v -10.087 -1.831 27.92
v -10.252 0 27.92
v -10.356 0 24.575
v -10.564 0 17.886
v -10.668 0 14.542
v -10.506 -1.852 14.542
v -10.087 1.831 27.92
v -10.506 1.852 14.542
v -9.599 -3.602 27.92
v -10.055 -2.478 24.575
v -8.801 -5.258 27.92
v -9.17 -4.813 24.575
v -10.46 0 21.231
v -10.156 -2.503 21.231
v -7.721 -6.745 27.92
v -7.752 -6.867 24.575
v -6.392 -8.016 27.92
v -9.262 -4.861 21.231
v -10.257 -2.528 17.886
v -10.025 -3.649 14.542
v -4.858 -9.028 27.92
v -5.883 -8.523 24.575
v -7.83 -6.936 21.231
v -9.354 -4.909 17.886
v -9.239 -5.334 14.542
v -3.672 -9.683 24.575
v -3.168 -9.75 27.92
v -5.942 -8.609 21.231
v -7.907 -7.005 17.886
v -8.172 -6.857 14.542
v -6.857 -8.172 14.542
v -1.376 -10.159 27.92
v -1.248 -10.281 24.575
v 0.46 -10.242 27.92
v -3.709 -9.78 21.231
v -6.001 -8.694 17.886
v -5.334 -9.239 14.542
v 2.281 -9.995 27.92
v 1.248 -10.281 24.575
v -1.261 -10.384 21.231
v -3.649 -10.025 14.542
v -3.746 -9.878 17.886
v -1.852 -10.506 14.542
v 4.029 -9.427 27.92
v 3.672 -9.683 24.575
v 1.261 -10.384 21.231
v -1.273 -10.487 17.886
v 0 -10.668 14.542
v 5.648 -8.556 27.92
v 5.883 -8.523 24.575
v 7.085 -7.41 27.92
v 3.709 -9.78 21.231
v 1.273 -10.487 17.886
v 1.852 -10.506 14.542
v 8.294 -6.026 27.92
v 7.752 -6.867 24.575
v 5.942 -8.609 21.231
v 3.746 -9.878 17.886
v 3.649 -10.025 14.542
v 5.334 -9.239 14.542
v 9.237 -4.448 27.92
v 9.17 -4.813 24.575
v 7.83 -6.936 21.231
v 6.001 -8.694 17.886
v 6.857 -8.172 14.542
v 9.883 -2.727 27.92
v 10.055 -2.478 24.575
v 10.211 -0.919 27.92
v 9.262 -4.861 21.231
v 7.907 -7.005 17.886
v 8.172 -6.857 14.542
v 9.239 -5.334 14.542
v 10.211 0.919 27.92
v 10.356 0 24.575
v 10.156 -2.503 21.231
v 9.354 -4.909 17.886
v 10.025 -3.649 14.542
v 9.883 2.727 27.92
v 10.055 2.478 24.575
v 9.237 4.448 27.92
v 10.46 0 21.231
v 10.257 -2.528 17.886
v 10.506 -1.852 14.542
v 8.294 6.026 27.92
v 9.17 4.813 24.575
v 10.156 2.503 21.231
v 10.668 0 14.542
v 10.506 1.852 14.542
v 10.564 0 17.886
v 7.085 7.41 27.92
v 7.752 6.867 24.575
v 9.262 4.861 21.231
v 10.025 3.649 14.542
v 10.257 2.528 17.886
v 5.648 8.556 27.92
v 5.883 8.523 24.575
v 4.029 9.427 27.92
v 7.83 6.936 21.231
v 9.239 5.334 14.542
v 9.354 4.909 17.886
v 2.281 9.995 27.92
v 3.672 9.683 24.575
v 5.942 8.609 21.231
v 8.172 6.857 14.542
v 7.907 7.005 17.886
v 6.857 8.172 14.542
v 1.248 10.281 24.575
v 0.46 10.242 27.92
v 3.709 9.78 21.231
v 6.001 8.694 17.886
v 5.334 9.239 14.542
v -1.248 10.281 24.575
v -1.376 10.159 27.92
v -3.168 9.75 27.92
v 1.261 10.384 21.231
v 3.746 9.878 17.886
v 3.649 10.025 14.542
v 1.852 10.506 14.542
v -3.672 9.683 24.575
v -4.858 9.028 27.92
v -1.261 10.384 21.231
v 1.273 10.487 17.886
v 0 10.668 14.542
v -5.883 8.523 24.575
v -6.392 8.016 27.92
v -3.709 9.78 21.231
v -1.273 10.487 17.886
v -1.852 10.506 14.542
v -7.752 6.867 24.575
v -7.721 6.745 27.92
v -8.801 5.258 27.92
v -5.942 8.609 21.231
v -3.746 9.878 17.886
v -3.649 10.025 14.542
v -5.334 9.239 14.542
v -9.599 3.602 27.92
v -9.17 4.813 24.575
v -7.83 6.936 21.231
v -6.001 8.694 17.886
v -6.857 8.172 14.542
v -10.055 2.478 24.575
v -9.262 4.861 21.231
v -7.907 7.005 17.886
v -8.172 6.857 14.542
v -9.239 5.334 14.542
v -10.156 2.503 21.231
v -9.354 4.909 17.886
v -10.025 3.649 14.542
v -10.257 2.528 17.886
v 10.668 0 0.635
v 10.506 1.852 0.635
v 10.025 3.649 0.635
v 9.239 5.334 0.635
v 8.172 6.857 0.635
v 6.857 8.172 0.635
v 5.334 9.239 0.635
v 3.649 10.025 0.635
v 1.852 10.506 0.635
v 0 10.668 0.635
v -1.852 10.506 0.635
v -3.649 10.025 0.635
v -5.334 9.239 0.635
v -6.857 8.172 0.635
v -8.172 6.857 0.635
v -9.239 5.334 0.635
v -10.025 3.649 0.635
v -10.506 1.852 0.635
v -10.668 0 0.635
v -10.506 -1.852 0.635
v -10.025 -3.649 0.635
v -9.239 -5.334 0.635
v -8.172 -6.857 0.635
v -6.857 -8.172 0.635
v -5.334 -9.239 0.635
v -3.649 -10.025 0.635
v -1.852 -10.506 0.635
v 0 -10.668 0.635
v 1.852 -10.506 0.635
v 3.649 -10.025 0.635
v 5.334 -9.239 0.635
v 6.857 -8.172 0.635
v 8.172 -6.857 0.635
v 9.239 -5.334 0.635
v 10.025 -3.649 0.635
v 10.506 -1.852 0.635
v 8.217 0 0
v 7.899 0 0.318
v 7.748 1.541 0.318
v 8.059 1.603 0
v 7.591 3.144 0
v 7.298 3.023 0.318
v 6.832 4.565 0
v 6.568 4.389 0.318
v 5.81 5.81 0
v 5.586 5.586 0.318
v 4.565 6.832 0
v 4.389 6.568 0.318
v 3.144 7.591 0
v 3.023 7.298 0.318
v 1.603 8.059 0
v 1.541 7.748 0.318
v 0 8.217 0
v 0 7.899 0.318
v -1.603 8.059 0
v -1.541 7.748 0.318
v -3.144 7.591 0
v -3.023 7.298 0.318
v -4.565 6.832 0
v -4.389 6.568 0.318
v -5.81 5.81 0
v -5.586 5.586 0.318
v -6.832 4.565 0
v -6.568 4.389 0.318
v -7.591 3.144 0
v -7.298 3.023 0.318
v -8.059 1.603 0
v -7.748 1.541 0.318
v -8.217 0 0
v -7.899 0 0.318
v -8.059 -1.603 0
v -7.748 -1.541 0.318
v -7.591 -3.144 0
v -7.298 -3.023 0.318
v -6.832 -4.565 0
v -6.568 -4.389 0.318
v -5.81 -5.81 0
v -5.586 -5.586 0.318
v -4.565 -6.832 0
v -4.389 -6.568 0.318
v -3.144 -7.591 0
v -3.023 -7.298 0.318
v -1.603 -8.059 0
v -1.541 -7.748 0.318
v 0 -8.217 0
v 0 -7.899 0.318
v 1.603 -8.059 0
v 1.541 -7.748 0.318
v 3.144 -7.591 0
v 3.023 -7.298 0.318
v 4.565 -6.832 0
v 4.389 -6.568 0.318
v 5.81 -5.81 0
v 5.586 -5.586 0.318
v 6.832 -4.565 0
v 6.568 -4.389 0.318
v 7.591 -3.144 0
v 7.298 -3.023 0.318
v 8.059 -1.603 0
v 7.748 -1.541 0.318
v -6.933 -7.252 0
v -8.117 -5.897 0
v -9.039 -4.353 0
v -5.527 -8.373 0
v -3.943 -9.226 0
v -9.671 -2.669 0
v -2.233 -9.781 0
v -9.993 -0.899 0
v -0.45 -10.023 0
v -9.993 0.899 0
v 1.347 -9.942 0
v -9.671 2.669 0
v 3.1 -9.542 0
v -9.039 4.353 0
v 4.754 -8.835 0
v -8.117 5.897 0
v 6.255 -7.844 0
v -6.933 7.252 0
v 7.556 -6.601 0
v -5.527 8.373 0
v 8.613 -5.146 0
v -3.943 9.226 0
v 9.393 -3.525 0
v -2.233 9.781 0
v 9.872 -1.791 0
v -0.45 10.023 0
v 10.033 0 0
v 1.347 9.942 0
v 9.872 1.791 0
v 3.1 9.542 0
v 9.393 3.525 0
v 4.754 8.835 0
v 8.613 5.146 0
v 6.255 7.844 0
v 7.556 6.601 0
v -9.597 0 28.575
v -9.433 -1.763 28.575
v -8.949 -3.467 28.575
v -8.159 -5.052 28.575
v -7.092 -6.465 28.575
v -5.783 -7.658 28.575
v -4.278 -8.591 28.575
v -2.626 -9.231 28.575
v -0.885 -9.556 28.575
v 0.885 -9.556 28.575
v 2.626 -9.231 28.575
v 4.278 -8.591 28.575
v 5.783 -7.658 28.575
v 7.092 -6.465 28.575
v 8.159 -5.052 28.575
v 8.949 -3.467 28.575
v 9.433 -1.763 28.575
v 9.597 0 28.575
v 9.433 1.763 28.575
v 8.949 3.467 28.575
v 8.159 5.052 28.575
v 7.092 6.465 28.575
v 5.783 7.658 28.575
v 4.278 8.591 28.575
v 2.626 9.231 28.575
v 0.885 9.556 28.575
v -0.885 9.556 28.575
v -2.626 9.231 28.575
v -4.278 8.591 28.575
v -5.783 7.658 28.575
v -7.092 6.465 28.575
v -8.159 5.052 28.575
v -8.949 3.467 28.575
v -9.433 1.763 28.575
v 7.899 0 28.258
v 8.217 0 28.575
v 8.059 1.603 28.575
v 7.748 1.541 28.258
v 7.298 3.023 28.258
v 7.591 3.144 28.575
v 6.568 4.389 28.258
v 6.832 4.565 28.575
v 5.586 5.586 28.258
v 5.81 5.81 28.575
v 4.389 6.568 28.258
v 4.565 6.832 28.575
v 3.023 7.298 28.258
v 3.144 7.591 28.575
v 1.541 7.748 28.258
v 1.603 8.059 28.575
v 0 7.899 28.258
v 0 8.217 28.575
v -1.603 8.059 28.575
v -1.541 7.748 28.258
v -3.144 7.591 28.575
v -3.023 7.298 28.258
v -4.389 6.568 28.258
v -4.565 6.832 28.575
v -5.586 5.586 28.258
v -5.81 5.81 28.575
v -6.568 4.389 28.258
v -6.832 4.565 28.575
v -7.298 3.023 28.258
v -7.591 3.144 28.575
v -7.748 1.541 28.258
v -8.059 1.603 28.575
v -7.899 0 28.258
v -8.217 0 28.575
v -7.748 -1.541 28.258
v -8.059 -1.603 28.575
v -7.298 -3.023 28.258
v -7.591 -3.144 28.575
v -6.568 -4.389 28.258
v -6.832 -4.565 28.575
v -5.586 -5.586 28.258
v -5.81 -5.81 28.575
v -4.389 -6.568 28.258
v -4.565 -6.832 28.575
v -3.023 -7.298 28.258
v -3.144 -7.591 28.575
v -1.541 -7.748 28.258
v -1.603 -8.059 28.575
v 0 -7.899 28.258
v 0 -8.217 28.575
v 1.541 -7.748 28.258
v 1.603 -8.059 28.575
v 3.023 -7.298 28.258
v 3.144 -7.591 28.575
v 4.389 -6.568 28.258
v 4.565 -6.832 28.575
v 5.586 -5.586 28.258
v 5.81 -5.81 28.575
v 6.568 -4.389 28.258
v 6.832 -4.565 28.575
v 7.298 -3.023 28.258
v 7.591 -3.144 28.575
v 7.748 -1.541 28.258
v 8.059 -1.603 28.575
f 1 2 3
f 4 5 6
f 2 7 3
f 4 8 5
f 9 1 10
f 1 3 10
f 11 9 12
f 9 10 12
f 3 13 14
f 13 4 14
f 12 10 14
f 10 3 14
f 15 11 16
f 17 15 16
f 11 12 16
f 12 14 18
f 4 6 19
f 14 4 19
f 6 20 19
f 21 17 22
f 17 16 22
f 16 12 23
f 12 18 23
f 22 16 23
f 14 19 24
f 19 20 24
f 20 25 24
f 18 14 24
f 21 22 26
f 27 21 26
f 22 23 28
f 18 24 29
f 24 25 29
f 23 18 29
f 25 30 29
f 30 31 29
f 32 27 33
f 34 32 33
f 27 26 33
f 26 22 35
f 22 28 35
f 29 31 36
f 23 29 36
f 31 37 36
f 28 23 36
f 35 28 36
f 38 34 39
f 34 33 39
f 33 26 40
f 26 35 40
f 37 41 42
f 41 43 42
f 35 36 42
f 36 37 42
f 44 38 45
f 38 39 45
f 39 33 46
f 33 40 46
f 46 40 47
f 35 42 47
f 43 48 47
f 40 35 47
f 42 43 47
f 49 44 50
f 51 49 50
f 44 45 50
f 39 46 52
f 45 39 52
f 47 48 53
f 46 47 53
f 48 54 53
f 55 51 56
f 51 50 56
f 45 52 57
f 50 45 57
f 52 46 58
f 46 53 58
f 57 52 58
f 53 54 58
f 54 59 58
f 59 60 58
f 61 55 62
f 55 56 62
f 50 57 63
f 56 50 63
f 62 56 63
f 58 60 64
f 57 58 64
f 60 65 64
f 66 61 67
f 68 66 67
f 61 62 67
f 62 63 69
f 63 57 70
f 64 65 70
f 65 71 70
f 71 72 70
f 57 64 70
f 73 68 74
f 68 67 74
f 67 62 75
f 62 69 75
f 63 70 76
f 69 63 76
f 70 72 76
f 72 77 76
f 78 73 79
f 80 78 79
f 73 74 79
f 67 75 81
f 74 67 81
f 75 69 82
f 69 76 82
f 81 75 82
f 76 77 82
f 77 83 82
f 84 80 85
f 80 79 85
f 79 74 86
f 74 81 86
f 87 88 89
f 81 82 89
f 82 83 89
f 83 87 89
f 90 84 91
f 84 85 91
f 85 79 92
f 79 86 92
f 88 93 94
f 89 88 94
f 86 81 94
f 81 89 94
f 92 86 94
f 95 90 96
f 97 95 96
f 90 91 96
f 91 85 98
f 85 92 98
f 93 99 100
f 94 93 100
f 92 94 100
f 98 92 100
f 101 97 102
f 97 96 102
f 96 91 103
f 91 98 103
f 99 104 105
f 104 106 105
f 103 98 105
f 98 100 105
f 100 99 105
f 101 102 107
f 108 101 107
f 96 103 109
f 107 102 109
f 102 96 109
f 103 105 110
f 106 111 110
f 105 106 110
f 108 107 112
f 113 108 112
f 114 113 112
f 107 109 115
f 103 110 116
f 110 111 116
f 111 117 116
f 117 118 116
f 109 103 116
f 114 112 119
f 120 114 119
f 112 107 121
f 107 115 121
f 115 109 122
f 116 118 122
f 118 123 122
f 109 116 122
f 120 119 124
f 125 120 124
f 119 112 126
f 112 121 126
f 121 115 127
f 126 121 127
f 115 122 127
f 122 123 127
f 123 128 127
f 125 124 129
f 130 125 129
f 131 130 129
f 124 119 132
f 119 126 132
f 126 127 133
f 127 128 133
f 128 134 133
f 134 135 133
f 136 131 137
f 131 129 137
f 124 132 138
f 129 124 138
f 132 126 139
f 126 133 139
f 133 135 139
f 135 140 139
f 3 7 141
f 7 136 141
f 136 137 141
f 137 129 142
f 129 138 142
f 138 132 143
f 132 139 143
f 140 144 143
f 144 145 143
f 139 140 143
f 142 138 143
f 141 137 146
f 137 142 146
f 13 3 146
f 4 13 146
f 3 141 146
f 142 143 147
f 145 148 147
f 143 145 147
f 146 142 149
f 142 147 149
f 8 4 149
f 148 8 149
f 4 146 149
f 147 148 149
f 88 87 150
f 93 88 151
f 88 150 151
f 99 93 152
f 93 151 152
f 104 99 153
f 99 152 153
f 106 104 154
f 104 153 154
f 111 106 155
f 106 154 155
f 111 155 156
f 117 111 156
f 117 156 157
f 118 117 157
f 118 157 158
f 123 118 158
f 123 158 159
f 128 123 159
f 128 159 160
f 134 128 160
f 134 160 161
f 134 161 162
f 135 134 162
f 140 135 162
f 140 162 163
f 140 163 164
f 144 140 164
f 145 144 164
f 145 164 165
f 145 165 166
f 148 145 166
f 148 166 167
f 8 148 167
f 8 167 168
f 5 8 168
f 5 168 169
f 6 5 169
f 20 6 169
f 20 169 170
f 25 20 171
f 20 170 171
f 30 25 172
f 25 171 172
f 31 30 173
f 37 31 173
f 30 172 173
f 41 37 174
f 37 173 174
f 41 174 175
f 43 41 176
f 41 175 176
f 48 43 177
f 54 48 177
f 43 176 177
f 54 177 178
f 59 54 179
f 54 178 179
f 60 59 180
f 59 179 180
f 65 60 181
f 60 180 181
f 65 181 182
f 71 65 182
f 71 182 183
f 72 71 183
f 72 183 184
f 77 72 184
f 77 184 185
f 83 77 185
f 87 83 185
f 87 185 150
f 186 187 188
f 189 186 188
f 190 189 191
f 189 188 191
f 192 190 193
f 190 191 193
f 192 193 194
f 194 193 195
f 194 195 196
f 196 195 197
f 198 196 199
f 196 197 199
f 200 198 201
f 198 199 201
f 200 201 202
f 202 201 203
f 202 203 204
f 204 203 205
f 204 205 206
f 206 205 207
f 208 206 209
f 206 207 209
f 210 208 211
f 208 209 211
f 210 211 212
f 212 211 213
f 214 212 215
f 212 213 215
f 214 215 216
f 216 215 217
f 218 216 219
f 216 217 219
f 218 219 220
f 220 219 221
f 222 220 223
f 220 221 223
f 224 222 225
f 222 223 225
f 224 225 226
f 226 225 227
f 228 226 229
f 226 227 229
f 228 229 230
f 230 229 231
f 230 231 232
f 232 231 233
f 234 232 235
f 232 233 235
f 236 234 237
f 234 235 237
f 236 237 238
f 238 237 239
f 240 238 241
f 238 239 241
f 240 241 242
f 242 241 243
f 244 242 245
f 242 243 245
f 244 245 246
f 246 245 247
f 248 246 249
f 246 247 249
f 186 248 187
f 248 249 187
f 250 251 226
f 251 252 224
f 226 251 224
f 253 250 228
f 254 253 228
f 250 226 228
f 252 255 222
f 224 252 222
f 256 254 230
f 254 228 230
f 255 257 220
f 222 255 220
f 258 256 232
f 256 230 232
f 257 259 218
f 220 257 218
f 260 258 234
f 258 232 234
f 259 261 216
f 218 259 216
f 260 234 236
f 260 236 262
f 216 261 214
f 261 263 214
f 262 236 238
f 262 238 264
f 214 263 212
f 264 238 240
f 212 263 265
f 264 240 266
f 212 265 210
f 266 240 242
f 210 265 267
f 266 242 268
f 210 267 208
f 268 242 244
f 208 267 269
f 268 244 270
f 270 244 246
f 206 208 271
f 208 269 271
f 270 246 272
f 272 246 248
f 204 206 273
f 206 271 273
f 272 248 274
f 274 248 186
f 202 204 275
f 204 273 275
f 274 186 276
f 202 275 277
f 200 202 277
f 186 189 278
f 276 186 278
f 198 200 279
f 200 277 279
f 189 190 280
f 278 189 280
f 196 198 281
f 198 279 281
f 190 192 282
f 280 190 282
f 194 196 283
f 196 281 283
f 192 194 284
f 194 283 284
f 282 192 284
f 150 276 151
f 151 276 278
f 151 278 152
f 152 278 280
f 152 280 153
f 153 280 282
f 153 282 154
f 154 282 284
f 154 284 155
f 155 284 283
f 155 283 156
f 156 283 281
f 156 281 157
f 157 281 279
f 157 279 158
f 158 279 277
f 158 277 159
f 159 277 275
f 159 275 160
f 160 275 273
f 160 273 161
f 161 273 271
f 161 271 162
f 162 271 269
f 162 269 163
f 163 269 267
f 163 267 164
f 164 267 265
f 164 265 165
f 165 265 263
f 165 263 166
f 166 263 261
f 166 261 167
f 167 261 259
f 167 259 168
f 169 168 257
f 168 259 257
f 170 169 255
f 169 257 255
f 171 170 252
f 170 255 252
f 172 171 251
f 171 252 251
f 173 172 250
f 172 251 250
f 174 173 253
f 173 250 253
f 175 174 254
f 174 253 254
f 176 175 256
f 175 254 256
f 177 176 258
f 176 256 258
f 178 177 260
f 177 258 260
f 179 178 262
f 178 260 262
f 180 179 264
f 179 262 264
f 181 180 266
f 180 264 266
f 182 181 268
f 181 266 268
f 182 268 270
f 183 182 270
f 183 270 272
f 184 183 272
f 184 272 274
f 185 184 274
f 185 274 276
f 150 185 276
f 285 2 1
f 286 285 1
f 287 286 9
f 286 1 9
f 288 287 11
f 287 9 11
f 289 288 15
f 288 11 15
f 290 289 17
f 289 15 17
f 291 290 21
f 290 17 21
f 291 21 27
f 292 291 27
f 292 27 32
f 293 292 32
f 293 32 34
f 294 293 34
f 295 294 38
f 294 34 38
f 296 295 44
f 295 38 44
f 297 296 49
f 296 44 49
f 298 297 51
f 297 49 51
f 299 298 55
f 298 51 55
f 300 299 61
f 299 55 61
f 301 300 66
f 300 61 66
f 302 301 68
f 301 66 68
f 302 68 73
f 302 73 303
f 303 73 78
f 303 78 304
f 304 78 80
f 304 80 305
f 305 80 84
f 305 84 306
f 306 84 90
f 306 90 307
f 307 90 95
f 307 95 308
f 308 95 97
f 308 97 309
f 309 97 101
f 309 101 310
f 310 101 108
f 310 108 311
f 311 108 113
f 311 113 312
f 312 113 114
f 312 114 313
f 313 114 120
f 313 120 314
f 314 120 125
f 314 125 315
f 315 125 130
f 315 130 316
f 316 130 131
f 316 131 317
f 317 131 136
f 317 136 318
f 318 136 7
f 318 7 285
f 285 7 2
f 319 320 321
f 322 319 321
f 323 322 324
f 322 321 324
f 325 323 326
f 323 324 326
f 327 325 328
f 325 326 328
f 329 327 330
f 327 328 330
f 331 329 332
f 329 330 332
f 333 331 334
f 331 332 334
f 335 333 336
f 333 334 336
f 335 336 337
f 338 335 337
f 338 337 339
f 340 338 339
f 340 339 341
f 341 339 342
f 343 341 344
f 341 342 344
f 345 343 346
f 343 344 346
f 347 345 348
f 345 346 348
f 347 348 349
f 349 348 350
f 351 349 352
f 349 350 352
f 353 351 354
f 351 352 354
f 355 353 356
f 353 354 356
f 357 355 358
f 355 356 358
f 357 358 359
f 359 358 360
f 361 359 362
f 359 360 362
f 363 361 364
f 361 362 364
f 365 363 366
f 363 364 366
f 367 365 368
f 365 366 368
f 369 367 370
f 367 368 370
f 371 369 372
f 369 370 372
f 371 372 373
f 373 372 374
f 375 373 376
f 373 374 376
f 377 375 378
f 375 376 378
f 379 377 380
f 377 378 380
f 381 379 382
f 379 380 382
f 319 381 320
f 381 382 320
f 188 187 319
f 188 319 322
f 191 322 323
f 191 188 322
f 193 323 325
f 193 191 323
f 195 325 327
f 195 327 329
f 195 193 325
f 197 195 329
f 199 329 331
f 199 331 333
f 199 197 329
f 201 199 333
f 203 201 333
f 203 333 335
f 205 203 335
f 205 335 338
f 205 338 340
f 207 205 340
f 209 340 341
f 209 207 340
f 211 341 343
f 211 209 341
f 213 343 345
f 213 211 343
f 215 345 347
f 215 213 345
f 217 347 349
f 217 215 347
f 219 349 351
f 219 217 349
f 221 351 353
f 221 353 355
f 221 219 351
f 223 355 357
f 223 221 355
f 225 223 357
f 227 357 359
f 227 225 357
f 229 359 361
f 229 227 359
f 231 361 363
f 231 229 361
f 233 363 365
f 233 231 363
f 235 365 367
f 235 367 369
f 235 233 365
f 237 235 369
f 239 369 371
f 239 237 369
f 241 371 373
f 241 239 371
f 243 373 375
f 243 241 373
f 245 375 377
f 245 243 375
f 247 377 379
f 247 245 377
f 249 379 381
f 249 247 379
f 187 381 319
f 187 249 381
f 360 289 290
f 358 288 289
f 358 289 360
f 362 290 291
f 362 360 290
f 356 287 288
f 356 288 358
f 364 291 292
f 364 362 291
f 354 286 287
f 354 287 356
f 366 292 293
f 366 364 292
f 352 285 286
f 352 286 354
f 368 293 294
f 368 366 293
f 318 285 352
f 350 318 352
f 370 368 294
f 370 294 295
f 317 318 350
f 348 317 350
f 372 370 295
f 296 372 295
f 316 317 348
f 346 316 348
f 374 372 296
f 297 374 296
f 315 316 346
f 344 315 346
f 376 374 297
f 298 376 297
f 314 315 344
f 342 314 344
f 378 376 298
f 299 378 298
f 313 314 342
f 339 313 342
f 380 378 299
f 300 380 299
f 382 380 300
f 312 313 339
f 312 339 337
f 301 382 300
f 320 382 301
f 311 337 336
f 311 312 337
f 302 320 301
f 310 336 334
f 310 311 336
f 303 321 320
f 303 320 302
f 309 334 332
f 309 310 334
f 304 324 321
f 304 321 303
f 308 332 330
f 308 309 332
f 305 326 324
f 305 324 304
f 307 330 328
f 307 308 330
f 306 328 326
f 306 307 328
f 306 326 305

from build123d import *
from OCP.BRepFilletAPI import BRepFilletAPI_MakeChamfer

# Parameters (mm, degrees)
PIPESKETCH_R    = 10.668
PIPESKETCH_R_2  = 7.8994
EXTRUSION_DEPTH = 28.575
CHAMFER1_SIZE   = 0.635
CHAMFER1_SIZE2  = 0.655683131
CHAMFER2_SIZE   = 0.3175


with BuildPart() as part:
    # PipeSketch → Extrusion (new body)
    with BuildSketch(Plane.XY):
        Circle(PIPESKETCH_R)
        Circle(PIPESKETCH_R_2, mode=Mode.SUBTRACT)
    extrude(amount=EXTRUSION_DEPTH)

    # Sketch3 → Cut-Revolve1 (revolve, cut)
    with BuildSketch(Plane(origin=(0, 0, 0), x_dir=(0, 0, -1), z_dir=(1, 0, 0))):
        Polygon((-28.575, 10.668), (-28.575, 10.231882895), (-14.5415, 10.668), align=None)
    revolve(axis=Axis((0, 0, 0), (0, 0, 1)), mode=Mode.SUBTRACT)

    # Chamfer1: one chamfer whose edges measure the first distance from different faces: ONE call of the kernel's chamfer builder (chamfer() names one face for all edges)
    chamfer1_edges_1 = [part.edges().sort_by_distance(p)[0] for p in [
        (-10.668, 0, 0),
    ]]
    chamfer1_edges_2 = [part.edges().sort_by_distance(p)[0] for p in [
        (0, -10.231882895, 28.575),
    ]]
    chamfer1_side_2 = [part.faces().sort_by_distance(p)[0] for p in [
        (0, -9.942481544, 28.575),
    ]]
    chamfer1 = BRepFilletAPI_MakeChamfer(part.part.solid().wrapped)
    for e in chamfer1_edges_1:
        chamfer1.Add(CHAMFER1_SIZE, e.wrapped)
    for e in chamfer1_edges_2:
        chamfer1.Add(CHAMFER1_SIZE, CHAMFER1_SIZE2, e.wrapped, chamfer1_side_2[0].wrapped)  # the first distance lies on this face
    add(Compound.cast(chamfer1.Shape()), mode=Mode.REPLACE)

    # Chamfer2
    chamfer2_edges = [part.edges().sort_by_distance(p)[0] for p in [
        (-7.8994, 0, 28.575),
        (-7.8994, 0, 0),
    ]]
    chamfer(chamfer2_edges, length=CHAMFER2_SIZE)


solid = part.part
